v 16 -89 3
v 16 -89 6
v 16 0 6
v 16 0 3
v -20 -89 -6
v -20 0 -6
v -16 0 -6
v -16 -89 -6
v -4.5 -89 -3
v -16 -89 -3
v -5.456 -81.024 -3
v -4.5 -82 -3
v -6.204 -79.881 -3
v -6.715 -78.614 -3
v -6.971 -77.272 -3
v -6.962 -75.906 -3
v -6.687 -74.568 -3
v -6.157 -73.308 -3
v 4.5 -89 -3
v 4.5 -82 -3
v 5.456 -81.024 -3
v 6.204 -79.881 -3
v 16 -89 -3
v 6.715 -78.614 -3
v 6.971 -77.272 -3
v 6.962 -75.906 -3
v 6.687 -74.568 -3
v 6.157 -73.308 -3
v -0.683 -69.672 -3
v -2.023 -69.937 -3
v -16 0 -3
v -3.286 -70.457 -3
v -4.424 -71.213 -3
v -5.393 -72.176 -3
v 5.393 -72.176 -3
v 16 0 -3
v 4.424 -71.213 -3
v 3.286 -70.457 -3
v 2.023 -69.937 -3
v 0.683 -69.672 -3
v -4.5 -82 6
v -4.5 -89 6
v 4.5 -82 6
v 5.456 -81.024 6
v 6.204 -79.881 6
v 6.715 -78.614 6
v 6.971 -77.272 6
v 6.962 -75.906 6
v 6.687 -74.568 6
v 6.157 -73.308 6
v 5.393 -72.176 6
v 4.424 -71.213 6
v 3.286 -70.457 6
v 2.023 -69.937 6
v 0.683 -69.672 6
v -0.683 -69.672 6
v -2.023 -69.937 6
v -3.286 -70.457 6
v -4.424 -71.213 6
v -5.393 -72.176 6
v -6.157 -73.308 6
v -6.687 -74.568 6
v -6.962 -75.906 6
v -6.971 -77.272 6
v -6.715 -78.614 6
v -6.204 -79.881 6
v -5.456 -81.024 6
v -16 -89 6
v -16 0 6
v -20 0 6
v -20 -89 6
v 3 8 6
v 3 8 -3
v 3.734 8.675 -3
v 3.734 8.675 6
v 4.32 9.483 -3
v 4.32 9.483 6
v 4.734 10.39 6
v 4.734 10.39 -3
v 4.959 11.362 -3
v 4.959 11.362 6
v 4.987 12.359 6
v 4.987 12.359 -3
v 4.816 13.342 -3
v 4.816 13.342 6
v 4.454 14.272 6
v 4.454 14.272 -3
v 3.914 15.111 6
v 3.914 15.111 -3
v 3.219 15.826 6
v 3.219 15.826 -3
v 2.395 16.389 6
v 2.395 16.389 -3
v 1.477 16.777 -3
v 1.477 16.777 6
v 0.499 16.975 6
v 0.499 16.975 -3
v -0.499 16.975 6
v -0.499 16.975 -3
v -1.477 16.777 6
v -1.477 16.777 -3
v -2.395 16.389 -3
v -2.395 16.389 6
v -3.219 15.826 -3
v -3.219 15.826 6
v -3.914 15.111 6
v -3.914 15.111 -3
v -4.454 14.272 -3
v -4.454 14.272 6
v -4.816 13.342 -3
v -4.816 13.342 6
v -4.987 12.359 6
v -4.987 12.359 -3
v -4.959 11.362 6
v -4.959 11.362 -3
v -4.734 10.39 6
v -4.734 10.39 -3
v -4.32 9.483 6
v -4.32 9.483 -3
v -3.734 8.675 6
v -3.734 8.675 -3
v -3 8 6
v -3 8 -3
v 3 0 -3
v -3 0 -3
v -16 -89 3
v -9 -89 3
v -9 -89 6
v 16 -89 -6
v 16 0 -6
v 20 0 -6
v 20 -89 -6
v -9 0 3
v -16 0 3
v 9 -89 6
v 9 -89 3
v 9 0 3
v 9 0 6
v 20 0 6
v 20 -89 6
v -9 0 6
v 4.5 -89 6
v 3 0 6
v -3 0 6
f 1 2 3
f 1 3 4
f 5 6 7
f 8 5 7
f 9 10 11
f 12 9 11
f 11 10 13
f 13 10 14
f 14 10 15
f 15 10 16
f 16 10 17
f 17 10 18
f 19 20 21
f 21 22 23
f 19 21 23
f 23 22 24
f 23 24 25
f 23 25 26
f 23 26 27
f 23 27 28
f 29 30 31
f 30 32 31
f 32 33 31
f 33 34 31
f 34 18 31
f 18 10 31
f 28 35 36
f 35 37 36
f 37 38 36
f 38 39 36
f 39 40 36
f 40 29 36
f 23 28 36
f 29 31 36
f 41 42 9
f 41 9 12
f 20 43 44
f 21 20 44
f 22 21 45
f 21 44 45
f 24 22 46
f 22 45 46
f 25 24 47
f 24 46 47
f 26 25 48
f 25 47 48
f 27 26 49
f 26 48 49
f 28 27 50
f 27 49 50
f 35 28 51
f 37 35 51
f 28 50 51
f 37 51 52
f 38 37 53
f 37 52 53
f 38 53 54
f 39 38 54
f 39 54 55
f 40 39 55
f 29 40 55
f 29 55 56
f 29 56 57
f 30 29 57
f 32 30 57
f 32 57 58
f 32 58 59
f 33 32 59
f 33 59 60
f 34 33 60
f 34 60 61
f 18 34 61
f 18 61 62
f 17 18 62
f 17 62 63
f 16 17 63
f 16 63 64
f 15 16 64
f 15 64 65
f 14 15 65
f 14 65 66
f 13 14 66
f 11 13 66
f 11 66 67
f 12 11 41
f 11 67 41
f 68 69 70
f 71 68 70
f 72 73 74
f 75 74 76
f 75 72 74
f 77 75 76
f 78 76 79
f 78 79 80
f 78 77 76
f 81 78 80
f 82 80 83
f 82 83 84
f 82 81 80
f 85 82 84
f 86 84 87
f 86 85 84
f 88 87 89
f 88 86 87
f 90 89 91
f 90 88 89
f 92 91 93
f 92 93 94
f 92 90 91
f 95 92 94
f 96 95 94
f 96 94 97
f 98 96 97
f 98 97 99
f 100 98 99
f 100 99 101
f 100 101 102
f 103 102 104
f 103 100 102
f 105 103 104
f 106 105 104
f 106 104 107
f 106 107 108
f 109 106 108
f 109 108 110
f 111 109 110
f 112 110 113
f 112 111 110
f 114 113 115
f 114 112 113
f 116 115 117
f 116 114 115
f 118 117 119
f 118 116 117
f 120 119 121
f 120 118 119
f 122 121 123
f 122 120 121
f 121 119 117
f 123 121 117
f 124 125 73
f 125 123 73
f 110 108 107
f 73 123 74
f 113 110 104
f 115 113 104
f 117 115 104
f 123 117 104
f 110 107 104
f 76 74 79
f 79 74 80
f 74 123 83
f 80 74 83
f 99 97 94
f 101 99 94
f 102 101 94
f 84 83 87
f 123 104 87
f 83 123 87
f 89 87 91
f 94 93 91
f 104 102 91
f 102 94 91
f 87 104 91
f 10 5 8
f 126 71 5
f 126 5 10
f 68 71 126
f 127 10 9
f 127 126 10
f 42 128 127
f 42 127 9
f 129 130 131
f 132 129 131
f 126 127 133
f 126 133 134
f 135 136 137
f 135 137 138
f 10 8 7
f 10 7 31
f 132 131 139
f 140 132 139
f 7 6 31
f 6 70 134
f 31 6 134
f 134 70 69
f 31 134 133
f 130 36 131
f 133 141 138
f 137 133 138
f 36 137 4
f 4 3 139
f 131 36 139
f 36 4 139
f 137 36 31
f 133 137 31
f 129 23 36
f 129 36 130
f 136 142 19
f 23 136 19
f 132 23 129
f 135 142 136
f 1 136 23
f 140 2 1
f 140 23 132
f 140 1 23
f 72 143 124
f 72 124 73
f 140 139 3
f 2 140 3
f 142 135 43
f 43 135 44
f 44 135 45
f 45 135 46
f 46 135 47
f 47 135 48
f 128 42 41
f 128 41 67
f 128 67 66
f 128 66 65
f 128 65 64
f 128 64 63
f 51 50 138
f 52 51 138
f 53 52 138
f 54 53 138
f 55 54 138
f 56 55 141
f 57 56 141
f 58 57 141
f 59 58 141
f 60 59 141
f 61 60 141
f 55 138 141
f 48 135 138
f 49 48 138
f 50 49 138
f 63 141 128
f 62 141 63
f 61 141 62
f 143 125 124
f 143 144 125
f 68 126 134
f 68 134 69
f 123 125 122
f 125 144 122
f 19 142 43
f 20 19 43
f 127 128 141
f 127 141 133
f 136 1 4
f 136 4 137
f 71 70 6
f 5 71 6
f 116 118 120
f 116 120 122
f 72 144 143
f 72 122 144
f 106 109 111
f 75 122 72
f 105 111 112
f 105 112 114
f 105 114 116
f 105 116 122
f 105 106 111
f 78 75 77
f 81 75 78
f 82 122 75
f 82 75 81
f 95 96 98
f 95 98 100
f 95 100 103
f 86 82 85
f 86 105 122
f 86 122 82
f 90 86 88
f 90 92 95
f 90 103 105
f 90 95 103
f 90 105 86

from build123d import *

# Parameters (mm, degrees)
PAD_DEPTH         = 89
POCKET_DEPTH      = 12.001
PAD001_DEPTH      = 6
PAD001_DEPTH_BACK = 3


with BuildPart() as body:
    # Sketch → Pad (new body)
    with BuildSketch(Plane.XZ):
        Polygon((-20, 6), (-20, -6), (-16, -6), (-16, -3), (-9, -3), (9, -3), (16, -3), (16, -6), (20, -6), (20, 6), (16, 6), (16, 3), (9, 3), (9, 6), (-9, 6), (-9, 3), (-16, 3), (-16, 6), align=None)
    extrude(amount=PAD_DEPTH)

    # Sketch002 (on Face14 of Pad) → Pocket (cut, through all)
    with BuildSketch(Plane(origin=(0, 0, 6), x_dir=(-1, 0, 0), z_dir=(0, 0, 1))):
        with BuildLine():
            Line((-4.5, 89), (4.5, 89))
            Line((4.5, 89), (4.5, 82))
            ThreePointArc((-4.5, 82), (0, 69.638097), (4.5, 82))
            Line((-4.5, 89), (-4.5, 82))
        make_face()
    extrude(amount=-POCKET_DEPTH, mode=Mode.SUBTRACT)


with BuildPart() as body001:
    # Sketch001 → Pad001 (new body, two sides)
    with BuildSketch(Plane.XY) as pad001_sk:
        with BuildLine():
            Line((-3, 0), (3, 0))
            Line((3, 0), (3, 8))
            ThreePointArc((3, 8), (0, 17), (-3, 8))
            Line((-3, 0), (-3, 8))
        make_face()
    extrude(amount=PAD001_DEPTH)
    extrude(pad001_sk.sketch, amount=-PAD001_DEPTH_BACK)


solid = Compound([body.part, body001.part])
